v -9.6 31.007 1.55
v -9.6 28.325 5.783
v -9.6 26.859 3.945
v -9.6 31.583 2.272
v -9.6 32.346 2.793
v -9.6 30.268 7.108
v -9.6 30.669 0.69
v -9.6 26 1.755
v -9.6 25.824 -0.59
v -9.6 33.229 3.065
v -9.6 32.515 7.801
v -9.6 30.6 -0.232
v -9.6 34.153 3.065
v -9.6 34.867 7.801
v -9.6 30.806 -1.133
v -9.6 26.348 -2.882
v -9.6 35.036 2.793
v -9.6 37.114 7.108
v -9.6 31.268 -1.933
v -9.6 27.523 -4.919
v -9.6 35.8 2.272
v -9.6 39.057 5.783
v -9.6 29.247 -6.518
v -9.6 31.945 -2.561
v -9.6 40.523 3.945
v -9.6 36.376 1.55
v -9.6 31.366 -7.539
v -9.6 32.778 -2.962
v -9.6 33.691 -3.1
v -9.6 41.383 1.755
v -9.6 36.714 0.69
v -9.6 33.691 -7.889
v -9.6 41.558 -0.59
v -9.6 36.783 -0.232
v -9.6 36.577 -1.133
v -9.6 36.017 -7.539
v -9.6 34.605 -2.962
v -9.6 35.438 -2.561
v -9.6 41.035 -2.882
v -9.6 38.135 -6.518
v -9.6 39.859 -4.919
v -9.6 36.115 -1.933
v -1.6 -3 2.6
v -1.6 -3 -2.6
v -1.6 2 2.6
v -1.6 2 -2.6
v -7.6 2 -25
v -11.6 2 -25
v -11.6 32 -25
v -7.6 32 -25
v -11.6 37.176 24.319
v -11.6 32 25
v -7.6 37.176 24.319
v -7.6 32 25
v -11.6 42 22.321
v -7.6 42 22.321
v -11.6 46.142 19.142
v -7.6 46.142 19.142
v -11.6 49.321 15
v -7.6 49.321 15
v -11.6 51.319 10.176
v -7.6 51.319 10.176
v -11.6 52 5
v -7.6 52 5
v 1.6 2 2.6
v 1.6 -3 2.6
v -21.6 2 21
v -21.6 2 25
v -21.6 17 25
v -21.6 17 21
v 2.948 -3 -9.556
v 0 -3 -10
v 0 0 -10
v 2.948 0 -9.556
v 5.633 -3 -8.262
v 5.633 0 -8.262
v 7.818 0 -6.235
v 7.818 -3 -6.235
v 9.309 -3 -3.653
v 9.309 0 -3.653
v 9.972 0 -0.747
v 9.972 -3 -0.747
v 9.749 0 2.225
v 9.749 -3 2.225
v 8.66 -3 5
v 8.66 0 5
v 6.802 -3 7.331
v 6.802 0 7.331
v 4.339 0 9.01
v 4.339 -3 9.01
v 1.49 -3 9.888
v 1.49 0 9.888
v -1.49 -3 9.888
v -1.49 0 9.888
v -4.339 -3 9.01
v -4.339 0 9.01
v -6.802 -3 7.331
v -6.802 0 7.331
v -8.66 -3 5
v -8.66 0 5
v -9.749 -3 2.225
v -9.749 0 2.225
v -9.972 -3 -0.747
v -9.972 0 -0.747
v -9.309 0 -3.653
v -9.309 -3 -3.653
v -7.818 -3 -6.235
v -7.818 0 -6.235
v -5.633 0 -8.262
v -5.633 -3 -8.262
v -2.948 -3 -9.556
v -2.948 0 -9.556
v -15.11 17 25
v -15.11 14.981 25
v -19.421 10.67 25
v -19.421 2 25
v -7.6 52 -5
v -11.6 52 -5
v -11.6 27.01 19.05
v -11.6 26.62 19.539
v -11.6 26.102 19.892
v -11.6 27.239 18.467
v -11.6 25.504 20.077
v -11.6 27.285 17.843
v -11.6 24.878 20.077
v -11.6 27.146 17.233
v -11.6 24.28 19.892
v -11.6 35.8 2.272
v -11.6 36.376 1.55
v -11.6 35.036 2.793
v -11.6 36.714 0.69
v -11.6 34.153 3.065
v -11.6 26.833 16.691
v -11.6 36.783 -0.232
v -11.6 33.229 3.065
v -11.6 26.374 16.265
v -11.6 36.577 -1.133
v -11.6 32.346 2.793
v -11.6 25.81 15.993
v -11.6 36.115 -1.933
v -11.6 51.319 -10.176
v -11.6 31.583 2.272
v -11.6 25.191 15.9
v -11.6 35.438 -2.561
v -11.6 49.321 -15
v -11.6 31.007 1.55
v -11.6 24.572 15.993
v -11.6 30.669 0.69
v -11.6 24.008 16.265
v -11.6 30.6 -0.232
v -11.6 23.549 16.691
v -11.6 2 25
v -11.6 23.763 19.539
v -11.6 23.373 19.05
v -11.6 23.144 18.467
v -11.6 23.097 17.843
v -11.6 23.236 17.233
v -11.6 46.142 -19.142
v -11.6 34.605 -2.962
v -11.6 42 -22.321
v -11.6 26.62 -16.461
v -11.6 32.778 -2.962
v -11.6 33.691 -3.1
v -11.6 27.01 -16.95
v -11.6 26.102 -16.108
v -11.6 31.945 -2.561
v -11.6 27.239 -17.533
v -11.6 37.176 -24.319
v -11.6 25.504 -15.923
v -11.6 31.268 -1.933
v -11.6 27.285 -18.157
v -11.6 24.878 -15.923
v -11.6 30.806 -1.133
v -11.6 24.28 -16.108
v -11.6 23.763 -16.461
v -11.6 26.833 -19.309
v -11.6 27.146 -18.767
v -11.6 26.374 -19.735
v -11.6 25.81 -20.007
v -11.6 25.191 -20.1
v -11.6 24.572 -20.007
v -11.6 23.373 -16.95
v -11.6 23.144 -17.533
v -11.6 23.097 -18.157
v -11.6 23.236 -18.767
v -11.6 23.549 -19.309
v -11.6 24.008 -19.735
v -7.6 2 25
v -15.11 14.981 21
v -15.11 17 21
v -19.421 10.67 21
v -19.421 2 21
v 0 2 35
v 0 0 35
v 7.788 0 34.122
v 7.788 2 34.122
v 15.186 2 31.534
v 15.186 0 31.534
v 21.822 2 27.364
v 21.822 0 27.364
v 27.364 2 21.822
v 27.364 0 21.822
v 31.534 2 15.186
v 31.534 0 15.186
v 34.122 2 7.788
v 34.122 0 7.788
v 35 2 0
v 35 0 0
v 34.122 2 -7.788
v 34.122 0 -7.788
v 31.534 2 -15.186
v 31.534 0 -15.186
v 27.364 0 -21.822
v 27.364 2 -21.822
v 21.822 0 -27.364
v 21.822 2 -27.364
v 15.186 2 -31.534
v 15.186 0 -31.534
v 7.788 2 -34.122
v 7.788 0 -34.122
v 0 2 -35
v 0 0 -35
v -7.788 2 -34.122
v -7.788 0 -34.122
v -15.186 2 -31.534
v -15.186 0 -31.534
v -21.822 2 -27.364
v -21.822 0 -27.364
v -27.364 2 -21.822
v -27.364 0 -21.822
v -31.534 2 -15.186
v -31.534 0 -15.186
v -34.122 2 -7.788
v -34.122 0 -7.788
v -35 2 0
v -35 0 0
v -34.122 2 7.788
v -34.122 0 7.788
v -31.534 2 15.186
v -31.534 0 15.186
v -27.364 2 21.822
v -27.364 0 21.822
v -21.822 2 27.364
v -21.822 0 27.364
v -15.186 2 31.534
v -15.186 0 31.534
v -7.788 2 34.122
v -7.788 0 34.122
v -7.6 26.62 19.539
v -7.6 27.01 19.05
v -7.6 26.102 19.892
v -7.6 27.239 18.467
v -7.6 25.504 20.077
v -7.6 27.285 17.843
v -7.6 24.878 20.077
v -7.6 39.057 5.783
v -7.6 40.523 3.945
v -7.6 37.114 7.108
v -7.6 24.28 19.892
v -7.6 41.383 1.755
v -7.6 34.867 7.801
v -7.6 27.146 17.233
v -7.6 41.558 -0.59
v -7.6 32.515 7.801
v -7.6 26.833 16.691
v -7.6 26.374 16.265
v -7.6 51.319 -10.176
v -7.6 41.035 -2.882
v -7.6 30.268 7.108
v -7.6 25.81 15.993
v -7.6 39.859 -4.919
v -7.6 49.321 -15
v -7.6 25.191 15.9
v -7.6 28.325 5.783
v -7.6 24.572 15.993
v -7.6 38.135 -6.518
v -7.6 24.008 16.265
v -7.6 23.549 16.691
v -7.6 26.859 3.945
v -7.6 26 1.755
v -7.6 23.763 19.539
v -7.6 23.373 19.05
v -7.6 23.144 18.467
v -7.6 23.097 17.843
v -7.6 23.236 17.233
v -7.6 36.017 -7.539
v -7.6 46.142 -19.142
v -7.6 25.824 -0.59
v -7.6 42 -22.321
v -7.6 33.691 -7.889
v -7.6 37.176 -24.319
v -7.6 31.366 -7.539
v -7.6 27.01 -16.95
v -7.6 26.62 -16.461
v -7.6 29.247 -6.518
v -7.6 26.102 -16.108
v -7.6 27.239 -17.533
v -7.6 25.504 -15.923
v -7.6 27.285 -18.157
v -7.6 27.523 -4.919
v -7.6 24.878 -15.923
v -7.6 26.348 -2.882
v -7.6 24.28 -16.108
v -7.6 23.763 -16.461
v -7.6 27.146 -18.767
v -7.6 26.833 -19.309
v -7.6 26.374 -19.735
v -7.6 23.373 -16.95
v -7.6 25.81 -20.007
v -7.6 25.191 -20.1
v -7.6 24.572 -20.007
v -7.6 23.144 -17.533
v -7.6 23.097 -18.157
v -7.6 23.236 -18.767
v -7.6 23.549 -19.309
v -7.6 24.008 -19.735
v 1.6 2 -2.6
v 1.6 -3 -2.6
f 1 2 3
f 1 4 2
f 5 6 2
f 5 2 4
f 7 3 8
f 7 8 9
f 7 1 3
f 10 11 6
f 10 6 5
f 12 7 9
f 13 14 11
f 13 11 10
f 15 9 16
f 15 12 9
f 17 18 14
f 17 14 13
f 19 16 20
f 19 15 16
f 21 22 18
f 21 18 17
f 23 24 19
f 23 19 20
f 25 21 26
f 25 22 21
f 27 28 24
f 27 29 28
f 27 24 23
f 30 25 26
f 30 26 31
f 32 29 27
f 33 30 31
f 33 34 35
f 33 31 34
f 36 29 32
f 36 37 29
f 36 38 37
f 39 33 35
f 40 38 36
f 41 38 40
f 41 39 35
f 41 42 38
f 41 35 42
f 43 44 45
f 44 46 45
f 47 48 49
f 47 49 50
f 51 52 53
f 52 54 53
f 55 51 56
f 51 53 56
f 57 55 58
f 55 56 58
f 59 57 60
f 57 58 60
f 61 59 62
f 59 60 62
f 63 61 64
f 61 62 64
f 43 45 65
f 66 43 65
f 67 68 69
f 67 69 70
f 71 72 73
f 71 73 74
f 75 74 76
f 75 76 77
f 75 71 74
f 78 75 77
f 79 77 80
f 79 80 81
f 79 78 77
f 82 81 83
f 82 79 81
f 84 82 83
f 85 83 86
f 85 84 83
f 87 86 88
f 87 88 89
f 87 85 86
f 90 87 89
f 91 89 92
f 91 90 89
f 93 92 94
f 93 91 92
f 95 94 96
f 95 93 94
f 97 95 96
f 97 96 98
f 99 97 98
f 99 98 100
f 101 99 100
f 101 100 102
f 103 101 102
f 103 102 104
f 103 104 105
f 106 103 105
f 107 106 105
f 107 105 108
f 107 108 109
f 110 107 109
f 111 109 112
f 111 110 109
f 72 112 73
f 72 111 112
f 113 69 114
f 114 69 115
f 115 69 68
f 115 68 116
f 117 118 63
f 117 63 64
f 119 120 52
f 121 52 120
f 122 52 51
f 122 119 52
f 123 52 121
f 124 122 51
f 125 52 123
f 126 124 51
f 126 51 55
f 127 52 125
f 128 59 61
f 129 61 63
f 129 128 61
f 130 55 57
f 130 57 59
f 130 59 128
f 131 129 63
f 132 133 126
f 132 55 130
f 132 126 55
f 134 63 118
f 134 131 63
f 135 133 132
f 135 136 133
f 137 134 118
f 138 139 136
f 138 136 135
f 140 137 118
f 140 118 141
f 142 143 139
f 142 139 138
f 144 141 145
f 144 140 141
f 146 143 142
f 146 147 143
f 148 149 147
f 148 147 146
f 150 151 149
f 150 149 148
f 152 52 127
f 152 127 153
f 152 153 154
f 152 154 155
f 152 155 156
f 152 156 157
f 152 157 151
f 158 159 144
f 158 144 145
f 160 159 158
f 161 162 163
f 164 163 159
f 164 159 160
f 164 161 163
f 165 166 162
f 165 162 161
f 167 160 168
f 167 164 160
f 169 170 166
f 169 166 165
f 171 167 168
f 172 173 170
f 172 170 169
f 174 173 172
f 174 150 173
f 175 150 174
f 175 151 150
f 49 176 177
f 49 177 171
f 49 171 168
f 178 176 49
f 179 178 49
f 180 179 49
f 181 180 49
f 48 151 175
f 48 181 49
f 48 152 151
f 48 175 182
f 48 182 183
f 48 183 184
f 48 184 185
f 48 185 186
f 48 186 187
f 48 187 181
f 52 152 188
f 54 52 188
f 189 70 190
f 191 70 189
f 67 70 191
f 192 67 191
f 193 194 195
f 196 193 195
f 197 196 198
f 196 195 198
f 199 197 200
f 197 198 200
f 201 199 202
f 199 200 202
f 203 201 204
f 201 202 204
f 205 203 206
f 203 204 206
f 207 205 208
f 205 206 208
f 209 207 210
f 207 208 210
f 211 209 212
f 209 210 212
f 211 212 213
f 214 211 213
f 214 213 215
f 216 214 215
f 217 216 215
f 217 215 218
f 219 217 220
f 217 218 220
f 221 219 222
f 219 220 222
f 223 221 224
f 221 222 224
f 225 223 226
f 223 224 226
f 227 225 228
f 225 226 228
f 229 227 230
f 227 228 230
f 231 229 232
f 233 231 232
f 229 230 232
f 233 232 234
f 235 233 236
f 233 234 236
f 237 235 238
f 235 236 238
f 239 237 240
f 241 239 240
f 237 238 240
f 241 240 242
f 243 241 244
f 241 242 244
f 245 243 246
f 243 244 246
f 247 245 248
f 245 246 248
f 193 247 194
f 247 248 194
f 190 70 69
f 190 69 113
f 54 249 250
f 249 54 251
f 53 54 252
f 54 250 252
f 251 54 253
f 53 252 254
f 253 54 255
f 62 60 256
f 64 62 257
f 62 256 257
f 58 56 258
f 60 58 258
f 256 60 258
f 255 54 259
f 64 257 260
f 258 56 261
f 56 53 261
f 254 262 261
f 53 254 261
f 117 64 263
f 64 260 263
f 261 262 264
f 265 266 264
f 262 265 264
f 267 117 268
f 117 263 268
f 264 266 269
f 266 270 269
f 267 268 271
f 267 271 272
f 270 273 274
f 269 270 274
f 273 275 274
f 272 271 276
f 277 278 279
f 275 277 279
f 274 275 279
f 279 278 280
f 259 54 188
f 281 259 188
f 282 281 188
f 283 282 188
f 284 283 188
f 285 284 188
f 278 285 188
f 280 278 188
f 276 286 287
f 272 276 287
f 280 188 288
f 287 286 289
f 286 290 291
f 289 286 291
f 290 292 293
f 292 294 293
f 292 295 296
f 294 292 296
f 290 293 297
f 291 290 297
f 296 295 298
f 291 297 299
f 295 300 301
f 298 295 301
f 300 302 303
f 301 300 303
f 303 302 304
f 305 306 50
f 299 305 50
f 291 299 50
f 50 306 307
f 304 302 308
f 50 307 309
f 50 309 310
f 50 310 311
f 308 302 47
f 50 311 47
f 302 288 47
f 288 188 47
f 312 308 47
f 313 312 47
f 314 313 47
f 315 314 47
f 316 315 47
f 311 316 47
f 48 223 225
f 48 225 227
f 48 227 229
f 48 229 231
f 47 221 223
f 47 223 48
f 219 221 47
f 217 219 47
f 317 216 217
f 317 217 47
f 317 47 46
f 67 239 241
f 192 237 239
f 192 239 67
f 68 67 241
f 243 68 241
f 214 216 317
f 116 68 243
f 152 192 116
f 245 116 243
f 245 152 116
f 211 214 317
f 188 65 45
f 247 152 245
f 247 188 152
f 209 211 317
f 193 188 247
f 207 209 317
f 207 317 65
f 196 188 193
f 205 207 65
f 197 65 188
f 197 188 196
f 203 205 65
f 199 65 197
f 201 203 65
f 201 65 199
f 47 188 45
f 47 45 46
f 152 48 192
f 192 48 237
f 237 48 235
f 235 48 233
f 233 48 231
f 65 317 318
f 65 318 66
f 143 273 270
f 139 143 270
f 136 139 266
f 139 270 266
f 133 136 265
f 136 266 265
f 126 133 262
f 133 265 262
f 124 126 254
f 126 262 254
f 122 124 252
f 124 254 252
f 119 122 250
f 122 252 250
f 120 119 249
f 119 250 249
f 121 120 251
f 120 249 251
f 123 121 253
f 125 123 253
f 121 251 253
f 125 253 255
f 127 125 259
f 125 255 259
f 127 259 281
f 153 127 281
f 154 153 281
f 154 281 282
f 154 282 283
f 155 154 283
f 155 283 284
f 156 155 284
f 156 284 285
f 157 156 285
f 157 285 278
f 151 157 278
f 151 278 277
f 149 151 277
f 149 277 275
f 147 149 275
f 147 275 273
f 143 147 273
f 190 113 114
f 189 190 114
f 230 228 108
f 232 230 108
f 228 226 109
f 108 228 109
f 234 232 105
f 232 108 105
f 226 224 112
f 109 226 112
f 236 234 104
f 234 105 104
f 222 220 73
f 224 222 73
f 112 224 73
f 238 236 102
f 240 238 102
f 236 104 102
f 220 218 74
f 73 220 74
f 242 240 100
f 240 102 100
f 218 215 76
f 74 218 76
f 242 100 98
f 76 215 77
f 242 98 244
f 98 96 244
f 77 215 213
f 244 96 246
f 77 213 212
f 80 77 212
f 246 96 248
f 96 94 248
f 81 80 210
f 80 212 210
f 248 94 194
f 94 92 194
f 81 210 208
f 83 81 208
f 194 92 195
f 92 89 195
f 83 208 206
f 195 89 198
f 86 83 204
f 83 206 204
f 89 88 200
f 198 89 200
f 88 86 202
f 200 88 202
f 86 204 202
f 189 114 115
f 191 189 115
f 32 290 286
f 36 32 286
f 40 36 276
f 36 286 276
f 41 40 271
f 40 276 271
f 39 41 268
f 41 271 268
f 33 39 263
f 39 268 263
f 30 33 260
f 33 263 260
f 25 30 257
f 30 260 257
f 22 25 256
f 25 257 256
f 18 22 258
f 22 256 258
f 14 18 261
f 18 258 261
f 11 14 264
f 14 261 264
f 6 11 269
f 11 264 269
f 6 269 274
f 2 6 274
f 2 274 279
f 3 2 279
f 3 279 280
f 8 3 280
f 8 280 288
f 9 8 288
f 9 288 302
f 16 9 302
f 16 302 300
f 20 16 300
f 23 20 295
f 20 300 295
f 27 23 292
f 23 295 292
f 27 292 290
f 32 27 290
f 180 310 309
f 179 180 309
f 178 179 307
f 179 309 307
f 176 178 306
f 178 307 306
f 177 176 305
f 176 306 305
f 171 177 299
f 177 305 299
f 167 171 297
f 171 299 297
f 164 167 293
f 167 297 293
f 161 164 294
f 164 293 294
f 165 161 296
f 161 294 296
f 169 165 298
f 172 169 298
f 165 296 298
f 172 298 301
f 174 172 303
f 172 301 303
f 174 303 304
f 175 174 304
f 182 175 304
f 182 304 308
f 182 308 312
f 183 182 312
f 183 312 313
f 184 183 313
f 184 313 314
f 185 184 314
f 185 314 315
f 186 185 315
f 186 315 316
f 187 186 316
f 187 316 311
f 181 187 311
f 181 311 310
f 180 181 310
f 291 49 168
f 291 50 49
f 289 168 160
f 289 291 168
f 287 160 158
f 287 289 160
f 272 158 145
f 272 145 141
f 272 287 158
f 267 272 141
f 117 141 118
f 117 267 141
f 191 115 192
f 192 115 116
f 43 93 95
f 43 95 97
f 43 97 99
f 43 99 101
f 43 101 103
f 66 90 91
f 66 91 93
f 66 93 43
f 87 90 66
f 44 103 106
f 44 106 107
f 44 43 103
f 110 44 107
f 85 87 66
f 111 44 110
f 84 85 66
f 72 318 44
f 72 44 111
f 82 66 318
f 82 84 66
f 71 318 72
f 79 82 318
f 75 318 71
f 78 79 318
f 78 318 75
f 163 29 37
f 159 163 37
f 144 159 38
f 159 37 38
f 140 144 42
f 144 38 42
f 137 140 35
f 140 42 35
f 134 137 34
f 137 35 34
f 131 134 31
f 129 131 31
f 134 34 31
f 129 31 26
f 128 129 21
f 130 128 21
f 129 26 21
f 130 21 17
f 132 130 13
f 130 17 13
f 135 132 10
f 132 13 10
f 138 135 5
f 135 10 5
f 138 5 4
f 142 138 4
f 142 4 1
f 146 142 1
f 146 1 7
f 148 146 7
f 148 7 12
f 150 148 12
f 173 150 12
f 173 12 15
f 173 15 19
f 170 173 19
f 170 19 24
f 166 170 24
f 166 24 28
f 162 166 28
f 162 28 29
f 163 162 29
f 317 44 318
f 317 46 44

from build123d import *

# Parameters (mm, degrees)
SKETCH1_R           = 35
SKETCH1_W           = 3.2
SKETCH1_H           = 5.2
BOSS_EXTRUDE1_DEPTH = 2
SKETCH2_W           = 7.2
SKETCH2_H           = 9.2
SKETCH2_W_2         = 3.2
SKETCH2_H_2         = 5.2
BOSS_EXTRUDE2_DEPTH = 3
SKETCH3_W           = 4
SKETCH3_H           = 50
BOSS_EXTRUDE3_DEPTH = 50
SKETCH4_R           = 3.1
SKETCH4_R_2         = 2.1
CUT_EXTRUDE1_DEPTH  = 50
FILLET1_R           = 20
SKETCH6_W           = 10
SKETCH6_H           = 4
BOSS_EXTRUDE4_DEPTH = 15
CUT_EXTRUDE2_DEPTH  = 15
SKETCH8_R           = 7.889109842
CUT_EXTRUDE3_DEPTH  = 2
SKETCH9_R           = 10
SKETCH9_W           = 7.2
SKETCH9_H           = 9.2
BOSS_EXTRUDE5_DEPTH = 3


with BuildPart() as part:
    # Sketch1 → Boss-Extrude1 (new body)
    with BuildSketch(Plane(origin=(0, 0, 0), x_dir=(1, 0, 0), z_dir=(0, 1, 0))):
        with Locations(Location((0, 0, 0), (0, 0, 270))):
            Circle(SKETCH1_R)
        Rectangle(SKETCH1_W, SKETCH1_H, mode=Mode.SUBTRACT)
    extrude(amount=BOSS_EXTRUDE1_DEPTH)

    # Sketch2 → Boss-Extrude2 (add)
    with BuildSketch(Plane.XZ):
        Rectangle(SKETCH2_W, SKETCH2_H)
        Rectangle(SKETCH2_W_2, SKETCH2_H_2, mode=Mode.SUBTRACT)
    extrude(amount=BOSS_EXTRUDE2_DEPTH)

    # Sketch3 → Boss-Extrude3 (add)
    with BuildSketch(Plane(origin=(0, 2, 0), x_dir=(1, 0, 0), z_dir=(0, 1, 0))):
        with Locations((-9.6, 0)):
            Rectangle(SKETCH3_W, SKETCH3_H)
    extrude(amount=BOSS_EXTRUDE3_DEPTH)

    # Sketch4 → Cut-Extrude1 (cut)
    with BuildSketch(Plane(origin=(-7.6, 0, 0), x_dir=(0, 0, -1), z_dir=(1, 0, 0))):
        with Locations((0, 33.691273446)):
            Circle(SKETCH4_R)
        with Locations((-18, 25.191273446)):
            Circle(SKETCH4_R_2)
        with Locations((18, 25.191273446)):
            Circle(SKETCH4_R_2)
    extrude(amount=-CUT_EXTRUDE1_DEPTH, mode=Mode.SUBTRACT)

    # Fillet1
    fillet1_edges = [part.edges().sort_by_distance(p)[0] for p in [
        (-9.6, 52, 25),
        (-9.6, 52, -25),
    ]]
    fillet(fillet1_edges, radius=FILLET1_R)

    # Sketch6 → Boss-Extrude4 (add)
    with BuildSketch(Plane(origin=(0, 2, 0), x_dir=(1, 0, 0), z_dir=(0, 1, 0))):
        with Locations((-16.6, -23)):
            Rectangle(SKETCH6_W, SKETCH6_H)
    extrude(amount=BOSS_EXTRUDE4_DEPTH)

    # Sketch7 → Cut-Extrude2 (cut)
    with BuildSketch(Plane.XY.offset(25)):
        Polygon((-11.6, 2), (-11.6, 17), (-15.110464725, 17), (-15.110464725, 14.98052876), (-19.421422774, 10.669570711), (-19.421422774, 2), align=None)
    extrude(amount=-CUT_EXTRUDE2_DEPTH, mode=Mode.SUBTRACT)

    # Sketch8 → Cut-Extrude3 (cut)
    with BuildSketch(Plane(origin=(-7.6, 0, 0), x_dir=(0, 0, -1), z_dir=(1, 0, 0))):
        with Locations((0, 33.691273446)):
            Circle(SKETCH8_R)
    extrude(amount=-CUT_EXTRUDE3_DEPTH, mode=Mode.SUBTRACT)

    # Sketch9 → Boss-Extrude5 (add)
    with BuildSketch(Plane.XZ.offset(3)):
        with Locations(Location((0, 0, 0), (0, 0, 270))):
            Circle(SKETCH9_R)
        Rectangle(SKETCH9_W, SKETCH9_H, mode=Mode.SUBTRACT)
    extrude(amount=-BOSS_EXTRUDE5_DEPTH)


solid = part.part
